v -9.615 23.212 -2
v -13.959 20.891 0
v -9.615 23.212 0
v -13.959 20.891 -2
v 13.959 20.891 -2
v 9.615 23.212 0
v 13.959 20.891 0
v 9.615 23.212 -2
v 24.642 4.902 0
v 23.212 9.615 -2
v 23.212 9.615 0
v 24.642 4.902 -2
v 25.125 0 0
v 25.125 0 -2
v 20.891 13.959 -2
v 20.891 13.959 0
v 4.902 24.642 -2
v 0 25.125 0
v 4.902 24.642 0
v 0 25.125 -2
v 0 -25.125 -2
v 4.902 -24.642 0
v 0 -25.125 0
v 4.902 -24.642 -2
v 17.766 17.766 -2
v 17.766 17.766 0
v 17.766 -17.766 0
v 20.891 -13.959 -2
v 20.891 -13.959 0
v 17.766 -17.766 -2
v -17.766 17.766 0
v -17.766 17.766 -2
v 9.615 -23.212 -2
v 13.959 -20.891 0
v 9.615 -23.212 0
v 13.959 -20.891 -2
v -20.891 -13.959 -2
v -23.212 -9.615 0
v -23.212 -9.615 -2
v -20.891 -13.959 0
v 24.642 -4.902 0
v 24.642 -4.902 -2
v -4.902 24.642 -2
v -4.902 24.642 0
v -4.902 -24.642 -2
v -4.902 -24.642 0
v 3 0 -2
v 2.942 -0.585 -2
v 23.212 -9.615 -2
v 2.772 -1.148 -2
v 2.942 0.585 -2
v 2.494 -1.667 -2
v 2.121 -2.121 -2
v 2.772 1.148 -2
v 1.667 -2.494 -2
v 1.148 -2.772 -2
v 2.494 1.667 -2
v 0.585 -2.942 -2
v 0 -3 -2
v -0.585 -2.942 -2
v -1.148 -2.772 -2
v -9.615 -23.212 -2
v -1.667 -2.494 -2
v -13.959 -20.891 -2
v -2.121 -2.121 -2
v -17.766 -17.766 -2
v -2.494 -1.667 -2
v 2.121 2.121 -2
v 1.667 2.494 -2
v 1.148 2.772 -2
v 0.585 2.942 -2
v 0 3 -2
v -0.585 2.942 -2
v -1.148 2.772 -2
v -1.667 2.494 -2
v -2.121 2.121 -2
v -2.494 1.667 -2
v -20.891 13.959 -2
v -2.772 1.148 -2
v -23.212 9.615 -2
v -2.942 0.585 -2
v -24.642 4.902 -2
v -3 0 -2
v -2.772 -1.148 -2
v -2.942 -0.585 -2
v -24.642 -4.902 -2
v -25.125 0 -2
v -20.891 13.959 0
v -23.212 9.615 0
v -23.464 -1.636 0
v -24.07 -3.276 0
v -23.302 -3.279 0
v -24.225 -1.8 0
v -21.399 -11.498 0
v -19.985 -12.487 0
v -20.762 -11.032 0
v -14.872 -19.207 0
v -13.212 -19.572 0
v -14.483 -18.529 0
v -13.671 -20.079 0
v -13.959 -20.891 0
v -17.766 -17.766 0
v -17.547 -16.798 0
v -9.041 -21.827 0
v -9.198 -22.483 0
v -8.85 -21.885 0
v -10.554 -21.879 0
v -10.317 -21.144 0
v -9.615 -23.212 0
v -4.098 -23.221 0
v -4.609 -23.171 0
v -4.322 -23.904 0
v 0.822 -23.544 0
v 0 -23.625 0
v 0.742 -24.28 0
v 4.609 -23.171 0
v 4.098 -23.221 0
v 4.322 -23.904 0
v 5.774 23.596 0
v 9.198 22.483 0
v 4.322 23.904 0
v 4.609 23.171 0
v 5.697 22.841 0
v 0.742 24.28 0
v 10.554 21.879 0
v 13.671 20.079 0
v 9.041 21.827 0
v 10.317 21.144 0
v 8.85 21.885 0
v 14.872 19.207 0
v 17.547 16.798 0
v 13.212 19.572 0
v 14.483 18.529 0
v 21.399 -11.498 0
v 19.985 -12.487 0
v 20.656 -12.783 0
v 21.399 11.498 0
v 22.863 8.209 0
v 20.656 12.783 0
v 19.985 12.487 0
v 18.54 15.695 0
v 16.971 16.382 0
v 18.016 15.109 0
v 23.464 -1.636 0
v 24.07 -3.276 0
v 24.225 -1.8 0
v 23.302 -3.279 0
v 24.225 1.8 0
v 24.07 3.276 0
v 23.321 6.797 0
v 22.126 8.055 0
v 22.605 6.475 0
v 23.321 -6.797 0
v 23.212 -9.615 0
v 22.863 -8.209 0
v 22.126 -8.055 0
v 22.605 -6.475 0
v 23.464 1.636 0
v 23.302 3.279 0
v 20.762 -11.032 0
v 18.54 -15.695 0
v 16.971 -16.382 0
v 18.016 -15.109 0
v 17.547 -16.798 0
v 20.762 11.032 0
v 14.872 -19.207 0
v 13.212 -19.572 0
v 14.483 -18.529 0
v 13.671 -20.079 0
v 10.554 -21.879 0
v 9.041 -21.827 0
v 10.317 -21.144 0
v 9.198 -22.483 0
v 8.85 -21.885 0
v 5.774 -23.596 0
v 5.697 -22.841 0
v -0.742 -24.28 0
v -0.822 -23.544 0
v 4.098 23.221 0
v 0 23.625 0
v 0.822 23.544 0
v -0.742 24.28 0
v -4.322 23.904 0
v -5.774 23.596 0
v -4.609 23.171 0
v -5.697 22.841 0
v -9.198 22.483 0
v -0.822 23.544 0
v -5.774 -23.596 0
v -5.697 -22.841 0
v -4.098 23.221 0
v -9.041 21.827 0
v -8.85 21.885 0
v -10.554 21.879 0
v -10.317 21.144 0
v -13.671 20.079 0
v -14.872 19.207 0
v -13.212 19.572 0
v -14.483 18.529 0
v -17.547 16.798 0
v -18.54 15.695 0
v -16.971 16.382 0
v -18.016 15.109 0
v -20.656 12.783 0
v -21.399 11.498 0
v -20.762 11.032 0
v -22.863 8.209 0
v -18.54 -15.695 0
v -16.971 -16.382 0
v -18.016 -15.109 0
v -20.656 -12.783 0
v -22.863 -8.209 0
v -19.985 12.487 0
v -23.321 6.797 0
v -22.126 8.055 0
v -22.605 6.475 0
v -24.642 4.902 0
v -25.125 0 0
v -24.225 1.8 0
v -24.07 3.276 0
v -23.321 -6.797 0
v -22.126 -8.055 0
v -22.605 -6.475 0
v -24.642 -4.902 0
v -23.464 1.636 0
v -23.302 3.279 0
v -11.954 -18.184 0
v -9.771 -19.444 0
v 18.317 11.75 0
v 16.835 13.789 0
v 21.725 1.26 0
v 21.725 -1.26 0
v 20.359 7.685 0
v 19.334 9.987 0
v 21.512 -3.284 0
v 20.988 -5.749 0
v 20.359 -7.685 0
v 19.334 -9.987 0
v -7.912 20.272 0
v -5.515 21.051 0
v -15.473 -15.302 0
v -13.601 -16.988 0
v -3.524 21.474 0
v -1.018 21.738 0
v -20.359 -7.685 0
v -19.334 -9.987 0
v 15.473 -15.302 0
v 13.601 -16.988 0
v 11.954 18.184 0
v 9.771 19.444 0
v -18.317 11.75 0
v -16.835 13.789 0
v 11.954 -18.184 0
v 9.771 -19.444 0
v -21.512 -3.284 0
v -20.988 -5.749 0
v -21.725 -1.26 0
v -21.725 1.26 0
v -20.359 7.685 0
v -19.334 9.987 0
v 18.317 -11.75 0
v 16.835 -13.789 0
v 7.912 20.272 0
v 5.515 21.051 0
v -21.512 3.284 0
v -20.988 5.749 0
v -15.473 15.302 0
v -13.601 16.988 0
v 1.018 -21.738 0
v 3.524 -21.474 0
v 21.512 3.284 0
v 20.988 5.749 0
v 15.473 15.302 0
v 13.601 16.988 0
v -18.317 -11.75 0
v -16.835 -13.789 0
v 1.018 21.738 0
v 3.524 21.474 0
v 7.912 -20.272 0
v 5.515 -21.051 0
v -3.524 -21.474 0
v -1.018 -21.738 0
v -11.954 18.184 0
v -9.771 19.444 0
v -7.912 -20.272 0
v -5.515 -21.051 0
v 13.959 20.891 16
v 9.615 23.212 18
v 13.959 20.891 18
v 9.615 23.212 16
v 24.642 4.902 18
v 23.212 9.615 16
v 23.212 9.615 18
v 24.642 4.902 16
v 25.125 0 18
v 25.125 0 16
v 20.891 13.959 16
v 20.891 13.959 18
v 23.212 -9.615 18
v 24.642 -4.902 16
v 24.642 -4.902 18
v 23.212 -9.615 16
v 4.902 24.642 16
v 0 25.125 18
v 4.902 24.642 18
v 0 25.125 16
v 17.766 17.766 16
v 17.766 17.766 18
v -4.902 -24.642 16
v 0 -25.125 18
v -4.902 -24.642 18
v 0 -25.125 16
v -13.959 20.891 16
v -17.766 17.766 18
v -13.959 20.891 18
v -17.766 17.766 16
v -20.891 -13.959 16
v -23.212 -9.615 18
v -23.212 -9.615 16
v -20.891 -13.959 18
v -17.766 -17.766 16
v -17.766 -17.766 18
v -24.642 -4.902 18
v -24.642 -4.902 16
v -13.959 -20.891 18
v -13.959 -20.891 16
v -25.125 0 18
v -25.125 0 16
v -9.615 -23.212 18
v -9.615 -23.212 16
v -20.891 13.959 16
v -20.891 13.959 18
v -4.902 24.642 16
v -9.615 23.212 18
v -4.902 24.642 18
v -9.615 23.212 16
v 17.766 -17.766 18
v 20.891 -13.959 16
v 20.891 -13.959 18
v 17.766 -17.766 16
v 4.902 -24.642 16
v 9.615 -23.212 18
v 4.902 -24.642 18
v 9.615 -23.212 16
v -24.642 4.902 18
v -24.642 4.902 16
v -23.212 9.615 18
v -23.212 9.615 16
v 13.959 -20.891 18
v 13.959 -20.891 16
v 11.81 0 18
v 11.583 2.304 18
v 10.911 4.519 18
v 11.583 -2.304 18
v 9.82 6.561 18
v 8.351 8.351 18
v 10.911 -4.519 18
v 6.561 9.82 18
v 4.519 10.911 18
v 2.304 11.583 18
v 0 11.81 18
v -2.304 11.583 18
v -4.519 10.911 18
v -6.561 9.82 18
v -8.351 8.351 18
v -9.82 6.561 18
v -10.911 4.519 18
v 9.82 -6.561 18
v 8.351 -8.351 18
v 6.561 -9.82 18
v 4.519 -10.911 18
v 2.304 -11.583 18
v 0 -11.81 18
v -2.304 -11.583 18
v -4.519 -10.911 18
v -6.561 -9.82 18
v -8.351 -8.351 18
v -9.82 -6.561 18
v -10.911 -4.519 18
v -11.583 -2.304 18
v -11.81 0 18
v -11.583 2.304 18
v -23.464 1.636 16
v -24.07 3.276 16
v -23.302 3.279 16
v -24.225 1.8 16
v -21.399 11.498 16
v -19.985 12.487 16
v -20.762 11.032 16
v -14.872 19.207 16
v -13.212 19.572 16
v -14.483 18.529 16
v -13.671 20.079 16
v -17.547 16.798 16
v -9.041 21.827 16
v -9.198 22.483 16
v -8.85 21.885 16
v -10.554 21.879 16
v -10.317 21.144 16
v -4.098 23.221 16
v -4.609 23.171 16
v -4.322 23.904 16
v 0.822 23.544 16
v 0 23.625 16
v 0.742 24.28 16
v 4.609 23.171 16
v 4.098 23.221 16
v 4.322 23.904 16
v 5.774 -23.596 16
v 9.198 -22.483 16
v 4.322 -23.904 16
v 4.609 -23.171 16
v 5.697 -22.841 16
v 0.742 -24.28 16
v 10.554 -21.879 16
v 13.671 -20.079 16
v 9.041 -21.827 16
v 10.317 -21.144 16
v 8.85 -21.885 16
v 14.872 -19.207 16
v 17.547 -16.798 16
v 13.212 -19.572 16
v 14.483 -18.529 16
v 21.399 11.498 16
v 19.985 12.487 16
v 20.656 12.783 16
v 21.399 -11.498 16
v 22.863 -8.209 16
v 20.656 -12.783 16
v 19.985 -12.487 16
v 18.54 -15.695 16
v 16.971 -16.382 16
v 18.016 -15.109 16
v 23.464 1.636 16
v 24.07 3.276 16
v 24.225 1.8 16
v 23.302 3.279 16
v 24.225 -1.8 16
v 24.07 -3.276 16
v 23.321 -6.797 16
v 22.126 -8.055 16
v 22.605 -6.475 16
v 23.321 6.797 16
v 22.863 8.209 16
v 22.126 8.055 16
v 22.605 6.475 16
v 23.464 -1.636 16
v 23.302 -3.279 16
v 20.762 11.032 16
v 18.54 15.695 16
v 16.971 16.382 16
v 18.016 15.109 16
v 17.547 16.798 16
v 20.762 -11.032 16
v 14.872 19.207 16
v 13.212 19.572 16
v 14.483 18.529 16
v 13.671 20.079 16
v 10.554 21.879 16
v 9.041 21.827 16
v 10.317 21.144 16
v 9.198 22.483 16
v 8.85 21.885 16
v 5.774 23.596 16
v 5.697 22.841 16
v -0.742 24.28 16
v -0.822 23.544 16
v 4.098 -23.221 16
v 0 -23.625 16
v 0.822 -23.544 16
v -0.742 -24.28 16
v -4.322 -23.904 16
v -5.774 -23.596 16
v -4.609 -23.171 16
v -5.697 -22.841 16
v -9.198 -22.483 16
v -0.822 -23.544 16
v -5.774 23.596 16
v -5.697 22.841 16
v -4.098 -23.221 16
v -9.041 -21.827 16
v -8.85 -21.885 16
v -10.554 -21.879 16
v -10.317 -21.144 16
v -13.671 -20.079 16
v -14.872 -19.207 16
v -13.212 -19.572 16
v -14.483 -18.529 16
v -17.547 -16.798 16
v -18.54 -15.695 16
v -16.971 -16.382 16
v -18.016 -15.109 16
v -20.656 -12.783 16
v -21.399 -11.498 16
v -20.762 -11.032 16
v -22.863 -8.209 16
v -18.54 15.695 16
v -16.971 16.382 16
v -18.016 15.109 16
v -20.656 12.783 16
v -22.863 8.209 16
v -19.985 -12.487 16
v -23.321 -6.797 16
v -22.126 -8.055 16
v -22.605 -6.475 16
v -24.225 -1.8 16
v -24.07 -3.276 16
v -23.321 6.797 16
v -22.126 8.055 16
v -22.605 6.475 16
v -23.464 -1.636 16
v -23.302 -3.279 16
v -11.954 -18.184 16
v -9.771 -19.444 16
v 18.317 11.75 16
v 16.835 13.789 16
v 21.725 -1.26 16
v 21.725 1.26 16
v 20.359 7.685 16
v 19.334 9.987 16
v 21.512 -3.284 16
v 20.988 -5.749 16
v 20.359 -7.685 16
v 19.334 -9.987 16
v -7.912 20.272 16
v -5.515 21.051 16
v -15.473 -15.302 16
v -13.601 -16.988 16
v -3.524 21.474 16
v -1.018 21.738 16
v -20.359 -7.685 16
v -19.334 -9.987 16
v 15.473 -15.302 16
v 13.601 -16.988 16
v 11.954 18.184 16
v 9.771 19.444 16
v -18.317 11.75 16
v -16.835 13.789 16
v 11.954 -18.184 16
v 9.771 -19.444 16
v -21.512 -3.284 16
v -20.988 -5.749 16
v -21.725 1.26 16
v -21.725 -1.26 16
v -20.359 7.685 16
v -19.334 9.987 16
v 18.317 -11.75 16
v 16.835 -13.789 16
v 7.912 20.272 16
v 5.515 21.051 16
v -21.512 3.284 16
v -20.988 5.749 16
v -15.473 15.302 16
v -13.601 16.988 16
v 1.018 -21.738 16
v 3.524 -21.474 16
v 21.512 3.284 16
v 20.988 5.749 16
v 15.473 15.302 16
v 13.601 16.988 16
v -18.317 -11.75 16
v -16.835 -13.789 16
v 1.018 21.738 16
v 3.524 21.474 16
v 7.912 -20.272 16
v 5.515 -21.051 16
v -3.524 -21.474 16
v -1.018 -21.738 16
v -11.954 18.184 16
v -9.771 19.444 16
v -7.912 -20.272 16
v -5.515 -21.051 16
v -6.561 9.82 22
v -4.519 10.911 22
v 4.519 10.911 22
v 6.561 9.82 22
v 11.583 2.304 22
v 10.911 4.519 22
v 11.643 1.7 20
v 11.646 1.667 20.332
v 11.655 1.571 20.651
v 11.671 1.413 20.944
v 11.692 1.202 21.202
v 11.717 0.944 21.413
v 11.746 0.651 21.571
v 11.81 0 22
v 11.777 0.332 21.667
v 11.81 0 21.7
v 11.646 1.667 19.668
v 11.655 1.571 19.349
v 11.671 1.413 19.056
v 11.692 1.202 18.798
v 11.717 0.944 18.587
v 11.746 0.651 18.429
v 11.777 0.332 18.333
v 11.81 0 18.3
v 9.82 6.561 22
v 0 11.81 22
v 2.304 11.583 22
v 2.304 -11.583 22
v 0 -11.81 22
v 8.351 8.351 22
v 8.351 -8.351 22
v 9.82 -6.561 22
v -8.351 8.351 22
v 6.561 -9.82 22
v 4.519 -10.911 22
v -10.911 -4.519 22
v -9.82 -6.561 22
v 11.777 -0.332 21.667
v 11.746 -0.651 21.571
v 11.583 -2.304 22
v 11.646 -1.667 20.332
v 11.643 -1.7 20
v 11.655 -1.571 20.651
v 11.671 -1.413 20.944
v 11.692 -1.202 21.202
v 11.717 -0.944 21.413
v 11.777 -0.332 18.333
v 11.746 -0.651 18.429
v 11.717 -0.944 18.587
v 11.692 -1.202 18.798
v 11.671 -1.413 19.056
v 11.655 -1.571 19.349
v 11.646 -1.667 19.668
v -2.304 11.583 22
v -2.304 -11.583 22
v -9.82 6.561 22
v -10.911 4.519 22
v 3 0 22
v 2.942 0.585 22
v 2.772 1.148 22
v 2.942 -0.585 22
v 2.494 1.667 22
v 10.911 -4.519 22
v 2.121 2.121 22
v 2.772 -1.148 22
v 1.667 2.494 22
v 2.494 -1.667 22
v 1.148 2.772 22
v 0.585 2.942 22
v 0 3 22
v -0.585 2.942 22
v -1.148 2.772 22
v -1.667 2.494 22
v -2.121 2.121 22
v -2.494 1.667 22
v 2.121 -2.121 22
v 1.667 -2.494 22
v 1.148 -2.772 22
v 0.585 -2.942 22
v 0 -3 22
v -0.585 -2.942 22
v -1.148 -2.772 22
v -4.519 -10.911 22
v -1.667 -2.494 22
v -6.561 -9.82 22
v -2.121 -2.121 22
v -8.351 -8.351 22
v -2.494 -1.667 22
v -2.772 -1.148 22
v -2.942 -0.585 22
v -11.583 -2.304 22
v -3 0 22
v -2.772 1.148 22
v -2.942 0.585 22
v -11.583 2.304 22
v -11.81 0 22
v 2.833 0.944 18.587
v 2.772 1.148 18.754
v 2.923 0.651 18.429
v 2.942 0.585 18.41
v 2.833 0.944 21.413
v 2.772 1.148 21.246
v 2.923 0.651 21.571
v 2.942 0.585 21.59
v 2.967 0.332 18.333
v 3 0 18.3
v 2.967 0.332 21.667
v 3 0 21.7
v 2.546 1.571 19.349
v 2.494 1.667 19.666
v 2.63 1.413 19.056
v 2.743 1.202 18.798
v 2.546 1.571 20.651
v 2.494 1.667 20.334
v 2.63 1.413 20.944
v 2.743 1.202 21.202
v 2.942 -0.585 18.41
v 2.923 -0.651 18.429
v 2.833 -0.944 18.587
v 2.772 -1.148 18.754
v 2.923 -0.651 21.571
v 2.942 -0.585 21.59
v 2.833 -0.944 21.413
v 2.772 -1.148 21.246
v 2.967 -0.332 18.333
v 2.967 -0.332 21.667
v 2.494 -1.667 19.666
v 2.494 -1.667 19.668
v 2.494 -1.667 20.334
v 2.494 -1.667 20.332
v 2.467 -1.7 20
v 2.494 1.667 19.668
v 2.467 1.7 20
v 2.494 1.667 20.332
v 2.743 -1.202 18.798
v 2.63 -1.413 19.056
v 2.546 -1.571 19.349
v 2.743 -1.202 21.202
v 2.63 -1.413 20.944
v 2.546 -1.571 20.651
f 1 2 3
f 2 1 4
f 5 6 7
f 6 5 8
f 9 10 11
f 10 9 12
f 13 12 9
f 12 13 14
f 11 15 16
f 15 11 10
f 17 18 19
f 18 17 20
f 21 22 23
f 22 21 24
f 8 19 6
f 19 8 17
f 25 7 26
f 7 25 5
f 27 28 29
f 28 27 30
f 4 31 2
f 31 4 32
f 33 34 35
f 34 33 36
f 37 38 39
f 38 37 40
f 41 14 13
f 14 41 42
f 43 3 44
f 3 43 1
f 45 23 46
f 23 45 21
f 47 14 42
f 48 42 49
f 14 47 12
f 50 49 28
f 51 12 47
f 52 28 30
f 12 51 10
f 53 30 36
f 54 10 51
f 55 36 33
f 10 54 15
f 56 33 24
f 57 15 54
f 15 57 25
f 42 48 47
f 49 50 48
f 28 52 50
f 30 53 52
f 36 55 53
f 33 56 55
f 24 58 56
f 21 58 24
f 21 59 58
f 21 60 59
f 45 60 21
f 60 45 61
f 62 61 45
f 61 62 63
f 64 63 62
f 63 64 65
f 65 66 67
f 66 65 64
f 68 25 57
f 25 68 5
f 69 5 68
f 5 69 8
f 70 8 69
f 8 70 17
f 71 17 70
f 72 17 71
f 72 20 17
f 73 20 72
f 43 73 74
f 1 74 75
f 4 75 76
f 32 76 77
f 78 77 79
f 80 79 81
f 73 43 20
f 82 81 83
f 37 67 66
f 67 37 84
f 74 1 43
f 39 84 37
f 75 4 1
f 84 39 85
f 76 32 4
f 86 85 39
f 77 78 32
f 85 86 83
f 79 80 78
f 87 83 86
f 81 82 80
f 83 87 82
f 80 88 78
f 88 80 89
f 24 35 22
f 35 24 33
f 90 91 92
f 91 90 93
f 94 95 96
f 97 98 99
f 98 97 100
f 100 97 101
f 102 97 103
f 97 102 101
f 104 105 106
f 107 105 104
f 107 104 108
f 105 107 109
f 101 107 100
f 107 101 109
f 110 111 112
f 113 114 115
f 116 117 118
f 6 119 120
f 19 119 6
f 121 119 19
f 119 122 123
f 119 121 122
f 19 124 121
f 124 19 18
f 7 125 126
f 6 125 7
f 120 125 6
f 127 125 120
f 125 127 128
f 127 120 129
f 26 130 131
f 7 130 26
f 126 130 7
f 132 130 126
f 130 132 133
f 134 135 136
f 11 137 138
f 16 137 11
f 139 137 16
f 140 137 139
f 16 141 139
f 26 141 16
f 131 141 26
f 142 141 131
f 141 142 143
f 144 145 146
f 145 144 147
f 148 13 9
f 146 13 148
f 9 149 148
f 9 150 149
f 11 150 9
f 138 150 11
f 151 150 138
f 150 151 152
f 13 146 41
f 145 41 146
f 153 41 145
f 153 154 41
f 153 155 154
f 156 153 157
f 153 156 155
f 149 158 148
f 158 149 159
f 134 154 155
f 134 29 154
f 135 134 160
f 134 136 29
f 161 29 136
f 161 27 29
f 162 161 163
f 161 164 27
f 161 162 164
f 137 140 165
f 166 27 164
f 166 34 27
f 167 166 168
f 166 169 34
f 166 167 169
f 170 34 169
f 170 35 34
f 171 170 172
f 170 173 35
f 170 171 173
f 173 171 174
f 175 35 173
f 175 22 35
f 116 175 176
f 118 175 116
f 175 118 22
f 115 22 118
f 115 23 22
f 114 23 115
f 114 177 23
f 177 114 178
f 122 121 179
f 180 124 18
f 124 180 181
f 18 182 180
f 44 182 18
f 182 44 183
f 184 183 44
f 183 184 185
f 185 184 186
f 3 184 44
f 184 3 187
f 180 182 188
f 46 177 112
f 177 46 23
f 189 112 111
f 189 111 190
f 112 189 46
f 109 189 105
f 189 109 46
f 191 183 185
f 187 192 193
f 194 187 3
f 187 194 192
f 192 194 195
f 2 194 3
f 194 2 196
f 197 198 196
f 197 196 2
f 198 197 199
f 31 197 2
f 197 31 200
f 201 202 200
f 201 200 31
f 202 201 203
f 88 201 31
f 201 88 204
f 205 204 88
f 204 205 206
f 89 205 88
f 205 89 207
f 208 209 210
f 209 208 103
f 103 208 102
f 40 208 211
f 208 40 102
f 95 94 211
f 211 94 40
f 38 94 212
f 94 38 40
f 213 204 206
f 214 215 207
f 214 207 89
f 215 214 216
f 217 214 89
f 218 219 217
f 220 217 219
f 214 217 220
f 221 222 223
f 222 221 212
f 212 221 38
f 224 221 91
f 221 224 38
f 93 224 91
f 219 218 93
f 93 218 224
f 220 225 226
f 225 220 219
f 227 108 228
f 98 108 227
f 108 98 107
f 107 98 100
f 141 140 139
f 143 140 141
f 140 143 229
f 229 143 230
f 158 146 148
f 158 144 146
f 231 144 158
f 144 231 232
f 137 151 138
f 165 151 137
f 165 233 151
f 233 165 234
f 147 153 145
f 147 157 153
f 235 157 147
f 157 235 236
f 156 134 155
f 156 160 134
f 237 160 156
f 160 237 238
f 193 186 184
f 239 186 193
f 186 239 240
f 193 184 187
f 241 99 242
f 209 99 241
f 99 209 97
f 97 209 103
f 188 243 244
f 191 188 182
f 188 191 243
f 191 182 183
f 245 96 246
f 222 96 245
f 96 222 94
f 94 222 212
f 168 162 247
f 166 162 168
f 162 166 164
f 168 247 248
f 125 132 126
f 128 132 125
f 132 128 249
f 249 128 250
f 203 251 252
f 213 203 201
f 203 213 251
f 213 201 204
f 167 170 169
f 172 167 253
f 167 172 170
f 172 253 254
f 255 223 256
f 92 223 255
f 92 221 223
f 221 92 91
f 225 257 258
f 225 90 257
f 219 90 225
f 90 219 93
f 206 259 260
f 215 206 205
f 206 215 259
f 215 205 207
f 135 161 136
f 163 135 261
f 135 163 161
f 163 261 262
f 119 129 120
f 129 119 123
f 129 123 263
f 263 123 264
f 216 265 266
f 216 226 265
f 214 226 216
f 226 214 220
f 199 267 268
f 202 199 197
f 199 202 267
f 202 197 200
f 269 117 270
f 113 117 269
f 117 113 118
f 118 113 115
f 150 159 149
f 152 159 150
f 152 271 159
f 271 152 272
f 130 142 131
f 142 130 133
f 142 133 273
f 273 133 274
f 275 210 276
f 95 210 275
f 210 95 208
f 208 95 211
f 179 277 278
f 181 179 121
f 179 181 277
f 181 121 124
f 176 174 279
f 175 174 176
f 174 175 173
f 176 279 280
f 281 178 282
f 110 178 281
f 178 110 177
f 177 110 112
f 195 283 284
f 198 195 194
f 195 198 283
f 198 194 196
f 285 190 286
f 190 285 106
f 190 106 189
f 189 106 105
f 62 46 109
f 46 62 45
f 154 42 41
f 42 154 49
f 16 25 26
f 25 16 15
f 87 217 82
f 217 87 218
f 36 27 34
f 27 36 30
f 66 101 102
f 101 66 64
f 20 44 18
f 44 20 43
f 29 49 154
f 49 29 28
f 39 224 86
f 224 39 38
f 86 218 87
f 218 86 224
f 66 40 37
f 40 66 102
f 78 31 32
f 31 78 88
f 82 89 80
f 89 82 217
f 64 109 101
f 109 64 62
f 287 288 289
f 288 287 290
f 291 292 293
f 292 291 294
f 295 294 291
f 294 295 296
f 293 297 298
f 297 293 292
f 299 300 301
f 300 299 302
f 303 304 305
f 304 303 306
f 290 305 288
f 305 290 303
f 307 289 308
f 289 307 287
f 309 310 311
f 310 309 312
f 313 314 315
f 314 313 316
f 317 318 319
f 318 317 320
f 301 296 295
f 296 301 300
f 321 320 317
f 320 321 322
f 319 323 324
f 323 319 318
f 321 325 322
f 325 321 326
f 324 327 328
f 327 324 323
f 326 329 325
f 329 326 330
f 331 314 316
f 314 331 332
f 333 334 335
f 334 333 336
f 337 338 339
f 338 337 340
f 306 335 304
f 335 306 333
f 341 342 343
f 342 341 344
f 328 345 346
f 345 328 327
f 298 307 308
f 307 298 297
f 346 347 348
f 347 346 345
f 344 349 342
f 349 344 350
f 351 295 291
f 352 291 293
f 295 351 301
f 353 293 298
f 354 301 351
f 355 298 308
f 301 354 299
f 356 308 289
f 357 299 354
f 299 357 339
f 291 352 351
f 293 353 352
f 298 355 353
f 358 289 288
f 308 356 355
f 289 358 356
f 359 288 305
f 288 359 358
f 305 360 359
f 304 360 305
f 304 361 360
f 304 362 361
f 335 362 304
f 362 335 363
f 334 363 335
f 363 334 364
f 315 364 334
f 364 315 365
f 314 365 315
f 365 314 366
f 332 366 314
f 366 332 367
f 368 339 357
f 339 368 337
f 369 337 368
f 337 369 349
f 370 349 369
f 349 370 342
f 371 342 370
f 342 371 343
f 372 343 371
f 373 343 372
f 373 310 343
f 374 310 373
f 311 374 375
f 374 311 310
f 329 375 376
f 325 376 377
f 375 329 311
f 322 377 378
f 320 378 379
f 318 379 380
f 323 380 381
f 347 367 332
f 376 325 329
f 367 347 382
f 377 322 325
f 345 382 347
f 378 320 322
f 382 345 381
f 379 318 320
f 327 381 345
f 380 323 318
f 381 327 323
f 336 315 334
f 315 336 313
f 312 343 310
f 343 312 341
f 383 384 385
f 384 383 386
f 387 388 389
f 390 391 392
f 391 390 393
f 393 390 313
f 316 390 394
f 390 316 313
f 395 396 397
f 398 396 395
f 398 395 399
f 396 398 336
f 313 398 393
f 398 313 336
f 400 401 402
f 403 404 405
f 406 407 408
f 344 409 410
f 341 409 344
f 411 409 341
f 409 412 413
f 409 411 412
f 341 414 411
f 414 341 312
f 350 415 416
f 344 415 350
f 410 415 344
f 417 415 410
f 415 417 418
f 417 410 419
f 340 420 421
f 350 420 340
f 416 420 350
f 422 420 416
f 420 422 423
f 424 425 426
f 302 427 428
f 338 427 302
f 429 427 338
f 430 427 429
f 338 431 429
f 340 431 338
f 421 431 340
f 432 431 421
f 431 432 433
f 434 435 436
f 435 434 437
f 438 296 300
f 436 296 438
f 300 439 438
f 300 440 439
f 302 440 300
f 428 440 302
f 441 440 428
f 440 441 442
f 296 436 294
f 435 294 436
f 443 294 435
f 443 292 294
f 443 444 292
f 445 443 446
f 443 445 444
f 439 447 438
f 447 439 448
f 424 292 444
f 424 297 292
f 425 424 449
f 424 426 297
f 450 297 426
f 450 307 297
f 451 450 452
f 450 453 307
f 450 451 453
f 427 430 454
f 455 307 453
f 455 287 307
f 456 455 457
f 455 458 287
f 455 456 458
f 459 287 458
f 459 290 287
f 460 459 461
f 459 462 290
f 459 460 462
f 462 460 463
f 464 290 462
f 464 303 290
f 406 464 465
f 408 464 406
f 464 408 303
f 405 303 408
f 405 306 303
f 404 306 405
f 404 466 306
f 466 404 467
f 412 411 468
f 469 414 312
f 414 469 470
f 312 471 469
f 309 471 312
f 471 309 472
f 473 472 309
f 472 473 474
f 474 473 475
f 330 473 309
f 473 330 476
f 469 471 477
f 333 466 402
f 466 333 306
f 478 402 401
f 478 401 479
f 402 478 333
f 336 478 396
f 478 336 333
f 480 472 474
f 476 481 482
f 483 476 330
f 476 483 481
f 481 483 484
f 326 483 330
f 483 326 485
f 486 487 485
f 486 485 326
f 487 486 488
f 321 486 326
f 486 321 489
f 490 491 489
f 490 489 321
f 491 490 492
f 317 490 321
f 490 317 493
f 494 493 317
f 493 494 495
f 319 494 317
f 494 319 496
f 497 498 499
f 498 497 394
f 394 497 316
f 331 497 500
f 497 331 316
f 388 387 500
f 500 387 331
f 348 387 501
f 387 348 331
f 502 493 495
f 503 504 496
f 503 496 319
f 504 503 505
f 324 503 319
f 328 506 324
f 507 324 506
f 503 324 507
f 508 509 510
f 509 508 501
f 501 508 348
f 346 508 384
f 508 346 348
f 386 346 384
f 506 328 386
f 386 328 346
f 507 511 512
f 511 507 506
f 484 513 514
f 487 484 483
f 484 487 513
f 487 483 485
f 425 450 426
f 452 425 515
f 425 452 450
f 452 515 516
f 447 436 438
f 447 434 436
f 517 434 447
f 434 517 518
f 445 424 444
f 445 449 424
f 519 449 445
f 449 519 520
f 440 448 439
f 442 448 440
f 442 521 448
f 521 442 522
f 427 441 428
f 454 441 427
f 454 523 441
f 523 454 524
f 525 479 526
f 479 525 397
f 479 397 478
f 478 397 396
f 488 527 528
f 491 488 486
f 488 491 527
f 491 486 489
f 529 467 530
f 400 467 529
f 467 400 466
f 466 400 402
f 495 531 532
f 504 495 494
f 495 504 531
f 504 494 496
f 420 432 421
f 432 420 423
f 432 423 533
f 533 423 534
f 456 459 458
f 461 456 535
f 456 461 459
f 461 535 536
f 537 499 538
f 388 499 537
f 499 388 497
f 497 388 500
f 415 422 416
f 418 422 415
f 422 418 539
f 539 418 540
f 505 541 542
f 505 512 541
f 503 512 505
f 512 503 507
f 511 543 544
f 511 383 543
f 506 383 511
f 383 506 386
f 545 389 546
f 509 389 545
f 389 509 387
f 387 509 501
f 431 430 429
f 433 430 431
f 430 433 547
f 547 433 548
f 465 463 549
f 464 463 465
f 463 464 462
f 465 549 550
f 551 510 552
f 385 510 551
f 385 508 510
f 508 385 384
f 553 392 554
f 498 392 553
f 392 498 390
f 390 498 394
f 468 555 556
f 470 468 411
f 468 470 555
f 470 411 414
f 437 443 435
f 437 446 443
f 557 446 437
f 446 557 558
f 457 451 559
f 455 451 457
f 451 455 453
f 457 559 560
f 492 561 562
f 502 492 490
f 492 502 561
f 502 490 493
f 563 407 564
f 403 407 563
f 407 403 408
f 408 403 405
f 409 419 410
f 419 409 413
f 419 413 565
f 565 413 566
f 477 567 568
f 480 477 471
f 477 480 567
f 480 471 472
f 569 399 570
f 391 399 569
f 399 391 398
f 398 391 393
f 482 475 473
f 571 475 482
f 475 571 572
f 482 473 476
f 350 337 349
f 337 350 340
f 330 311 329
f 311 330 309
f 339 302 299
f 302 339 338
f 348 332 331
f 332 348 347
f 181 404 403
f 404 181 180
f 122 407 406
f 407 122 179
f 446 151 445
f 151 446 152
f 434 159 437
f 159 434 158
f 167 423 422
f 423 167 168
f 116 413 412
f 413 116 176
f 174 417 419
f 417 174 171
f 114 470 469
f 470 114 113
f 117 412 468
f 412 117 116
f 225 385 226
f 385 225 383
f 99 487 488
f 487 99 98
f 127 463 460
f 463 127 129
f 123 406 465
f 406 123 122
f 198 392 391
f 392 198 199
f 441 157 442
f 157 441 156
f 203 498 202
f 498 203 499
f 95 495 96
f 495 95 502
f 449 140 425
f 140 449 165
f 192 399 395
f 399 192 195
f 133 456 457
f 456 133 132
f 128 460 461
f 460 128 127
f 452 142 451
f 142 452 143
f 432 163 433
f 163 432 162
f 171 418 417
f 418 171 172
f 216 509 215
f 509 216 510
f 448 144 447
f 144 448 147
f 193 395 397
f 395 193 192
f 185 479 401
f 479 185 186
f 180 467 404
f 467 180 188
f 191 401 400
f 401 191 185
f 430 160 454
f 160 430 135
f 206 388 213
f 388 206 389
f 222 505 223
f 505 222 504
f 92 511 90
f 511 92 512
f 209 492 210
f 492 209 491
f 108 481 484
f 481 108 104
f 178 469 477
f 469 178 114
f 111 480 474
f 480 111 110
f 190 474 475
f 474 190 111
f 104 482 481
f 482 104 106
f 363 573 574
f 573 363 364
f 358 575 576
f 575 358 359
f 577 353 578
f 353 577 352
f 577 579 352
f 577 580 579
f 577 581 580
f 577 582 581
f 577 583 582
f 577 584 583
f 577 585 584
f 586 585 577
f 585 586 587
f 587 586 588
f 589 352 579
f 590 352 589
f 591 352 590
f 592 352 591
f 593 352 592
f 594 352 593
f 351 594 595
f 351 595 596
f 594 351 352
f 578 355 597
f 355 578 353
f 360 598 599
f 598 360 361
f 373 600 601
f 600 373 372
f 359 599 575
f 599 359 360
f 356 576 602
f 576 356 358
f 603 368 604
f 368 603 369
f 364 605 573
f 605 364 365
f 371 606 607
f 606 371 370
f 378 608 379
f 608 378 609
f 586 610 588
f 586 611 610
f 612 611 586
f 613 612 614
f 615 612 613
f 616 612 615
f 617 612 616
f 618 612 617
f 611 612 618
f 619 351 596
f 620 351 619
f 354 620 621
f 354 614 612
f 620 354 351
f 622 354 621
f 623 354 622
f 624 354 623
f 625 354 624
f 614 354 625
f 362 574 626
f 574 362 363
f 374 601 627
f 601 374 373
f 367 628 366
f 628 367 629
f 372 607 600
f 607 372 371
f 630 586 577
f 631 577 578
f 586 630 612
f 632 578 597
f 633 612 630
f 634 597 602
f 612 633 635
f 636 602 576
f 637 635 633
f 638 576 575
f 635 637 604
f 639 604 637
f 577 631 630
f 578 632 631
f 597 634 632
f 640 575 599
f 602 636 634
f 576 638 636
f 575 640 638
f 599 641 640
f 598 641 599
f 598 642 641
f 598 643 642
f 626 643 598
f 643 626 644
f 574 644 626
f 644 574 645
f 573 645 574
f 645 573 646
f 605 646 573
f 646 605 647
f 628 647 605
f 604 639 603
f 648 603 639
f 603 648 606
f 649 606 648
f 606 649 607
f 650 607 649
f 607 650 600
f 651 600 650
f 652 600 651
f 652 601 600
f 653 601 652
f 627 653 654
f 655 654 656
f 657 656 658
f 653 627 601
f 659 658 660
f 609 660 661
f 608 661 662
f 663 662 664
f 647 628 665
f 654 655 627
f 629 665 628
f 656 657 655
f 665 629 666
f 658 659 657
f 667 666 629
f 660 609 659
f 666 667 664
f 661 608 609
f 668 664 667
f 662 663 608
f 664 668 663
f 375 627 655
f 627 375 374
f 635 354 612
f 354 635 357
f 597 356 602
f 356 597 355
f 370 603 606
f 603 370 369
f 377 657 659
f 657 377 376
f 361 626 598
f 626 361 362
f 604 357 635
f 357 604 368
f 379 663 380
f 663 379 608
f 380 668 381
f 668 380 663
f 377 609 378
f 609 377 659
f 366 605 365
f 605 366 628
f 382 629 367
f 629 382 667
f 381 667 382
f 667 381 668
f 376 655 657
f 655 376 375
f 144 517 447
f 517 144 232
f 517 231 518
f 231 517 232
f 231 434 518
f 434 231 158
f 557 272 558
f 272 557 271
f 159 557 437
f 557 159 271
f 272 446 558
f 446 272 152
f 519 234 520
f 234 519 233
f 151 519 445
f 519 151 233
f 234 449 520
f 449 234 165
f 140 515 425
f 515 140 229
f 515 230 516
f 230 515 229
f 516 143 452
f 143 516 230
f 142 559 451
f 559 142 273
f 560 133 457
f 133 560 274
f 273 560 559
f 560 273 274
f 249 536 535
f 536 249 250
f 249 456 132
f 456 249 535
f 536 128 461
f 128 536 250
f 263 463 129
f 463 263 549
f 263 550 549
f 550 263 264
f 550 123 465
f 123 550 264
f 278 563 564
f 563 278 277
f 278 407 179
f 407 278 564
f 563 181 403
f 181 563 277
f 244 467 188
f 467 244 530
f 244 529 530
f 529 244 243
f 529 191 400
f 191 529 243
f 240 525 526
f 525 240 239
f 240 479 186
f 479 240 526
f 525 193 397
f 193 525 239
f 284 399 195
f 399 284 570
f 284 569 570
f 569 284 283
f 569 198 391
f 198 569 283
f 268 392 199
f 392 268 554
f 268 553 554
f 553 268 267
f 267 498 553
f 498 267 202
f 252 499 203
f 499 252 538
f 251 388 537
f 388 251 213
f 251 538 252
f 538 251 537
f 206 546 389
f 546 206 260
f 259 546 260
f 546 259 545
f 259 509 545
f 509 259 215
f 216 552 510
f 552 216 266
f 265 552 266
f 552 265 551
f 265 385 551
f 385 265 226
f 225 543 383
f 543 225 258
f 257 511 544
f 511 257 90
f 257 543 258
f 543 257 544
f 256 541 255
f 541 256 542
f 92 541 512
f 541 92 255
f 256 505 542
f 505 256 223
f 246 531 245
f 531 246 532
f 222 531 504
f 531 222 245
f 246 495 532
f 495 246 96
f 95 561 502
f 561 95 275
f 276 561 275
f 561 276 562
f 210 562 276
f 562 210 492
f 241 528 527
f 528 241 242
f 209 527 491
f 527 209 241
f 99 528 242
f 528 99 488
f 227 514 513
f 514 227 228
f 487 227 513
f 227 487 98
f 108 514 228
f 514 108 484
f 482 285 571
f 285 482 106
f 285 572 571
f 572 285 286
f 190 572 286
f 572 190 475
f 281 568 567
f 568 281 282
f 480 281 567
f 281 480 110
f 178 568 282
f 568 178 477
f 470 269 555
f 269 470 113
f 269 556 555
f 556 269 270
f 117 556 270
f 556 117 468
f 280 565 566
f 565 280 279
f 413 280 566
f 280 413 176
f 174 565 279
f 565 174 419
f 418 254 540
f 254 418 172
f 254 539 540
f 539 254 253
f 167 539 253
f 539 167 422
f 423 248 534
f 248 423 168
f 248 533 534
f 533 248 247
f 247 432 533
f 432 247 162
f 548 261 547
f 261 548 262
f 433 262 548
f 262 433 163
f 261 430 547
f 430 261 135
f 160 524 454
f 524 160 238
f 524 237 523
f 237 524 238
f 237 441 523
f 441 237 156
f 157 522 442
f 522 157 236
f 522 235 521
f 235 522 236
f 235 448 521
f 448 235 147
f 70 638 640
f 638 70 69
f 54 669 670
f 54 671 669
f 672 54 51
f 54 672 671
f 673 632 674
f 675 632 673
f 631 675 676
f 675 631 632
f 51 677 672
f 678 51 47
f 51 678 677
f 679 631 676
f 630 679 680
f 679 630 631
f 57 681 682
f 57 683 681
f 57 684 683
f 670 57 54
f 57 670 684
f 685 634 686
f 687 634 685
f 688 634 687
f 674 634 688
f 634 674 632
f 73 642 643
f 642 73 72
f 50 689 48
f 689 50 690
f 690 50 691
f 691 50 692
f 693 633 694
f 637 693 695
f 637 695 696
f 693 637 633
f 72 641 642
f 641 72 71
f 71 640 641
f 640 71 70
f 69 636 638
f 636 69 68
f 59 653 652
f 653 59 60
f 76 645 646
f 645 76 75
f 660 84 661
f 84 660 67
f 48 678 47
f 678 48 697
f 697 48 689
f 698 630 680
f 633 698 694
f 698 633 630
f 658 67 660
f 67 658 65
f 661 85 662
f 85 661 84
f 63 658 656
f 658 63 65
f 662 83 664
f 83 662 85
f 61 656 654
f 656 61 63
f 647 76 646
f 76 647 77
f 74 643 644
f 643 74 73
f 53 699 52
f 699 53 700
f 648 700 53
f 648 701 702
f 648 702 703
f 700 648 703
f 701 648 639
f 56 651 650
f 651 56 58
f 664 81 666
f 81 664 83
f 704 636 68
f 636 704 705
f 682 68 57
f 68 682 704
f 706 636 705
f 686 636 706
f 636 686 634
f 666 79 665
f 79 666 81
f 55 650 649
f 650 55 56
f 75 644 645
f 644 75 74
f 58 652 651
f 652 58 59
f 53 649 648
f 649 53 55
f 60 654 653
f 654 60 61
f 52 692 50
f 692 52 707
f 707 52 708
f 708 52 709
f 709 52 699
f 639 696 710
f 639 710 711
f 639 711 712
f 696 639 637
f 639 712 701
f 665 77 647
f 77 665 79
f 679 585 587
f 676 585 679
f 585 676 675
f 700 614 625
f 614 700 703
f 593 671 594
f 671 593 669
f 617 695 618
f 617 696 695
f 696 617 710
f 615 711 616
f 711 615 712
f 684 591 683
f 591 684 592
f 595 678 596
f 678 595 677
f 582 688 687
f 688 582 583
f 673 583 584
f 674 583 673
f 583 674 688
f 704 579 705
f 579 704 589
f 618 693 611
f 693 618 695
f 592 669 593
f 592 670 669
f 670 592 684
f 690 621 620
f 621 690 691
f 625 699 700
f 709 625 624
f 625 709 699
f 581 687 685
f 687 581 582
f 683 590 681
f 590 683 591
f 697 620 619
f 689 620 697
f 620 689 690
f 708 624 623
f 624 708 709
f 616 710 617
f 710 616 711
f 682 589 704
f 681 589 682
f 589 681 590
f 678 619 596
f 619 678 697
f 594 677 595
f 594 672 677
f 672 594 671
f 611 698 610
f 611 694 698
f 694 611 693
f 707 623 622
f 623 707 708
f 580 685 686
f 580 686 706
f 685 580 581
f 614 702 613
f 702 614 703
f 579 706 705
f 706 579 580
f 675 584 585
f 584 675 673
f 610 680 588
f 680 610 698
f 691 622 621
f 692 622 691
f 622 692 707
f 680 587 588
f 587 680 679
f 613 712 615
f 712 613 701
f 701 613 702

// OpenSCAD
$fn = 32;

// ----------------------------------------------------------------------
// Timing pulley: T5 30T, pitch 5 mm, 50.25 mm x 24 mm
// ----------------------------------------------------------------------

// --- parameters (mm) ---
belt_pitch = 5;           // belt pitch
n_teeth = 30;             // number of grooves
rim_w = 16;               // belt width between the flanges
tip_d = 47.25;            // tip circle diameter
root_d = 44.65;           // groove bottom diameter
groove_h = 1.3;           // groove depth
tooth_w = 3;              // groove width at the tip circle
rim_d = 50.25;            // flange diameter
rim_t = 2;                // flange thickness
spigot_d = 43.05;         // flange spigot, sunk into the rim
spigot_h = 1.2;           // spigot depth into the rim
shaft_d = 6;              // shaft bore
hub_d = 23.62;            // hub diameter
hub_h = 4;                // hub above the flange
bottom_z = -2;            // lowest point of the pulley
top_z = 22;               // highest point of the pulley
set_d = 3.4;              // set screw tap hole

module rim() {
  cylinder(h = rim_w, d = tip_d);
}

module groove_cutter() {
  /* belt tooth groove: deeper than wide, cut through the belt width */
  translate([root_d / 2, 0, 0])
    linear_extrude(height = rim_w)
      polygon(points = [[-0.6, -tooth_w * 0.42], [groove_h + 0.6, -tooth_w * 0.6],
                        [groove_h + 0.6, tooth_w * 0.6], [-0.6, tooth_w * 0.42]]);
}

module flanges() {
  translate([0, 0, -rim_t]) cylinder(h = rim_t, d = rim_d);
  translate([0, 0, rim_w]) cylinder(h = rim_t, d = rim_d);
  translate([0, 0, -spigot_h]) cylinder(h = spigot_h + 0.6, d = spigot_d);
  translate([0, 0, rim_w - 0.6]) cylinder(h = spigot_h + 0.6, d = spigot_d);
}

module hub() {
  translate([0, 0, bottom_z]) cylinder(h = top_z - bottom_z, d = hub_d);
}

difference() {
  union() {
    rim();
    hub();
    flanges();
  }
  for (i = [0 : n_teeth - 1]) rotate([0, 0, i * 360 / n_teeth]) groove_cutter();
  translate([0, 0, bottom_z - 1]) cylinder(h = top_z - bottom_z + 2, d = shaft_d);
  translate([-1, 0, top_z - hub_h * 0.5]) rotate([0, 90, 0]) cylinder(h = hub_d / 2 + 3, d = set_d);
}
